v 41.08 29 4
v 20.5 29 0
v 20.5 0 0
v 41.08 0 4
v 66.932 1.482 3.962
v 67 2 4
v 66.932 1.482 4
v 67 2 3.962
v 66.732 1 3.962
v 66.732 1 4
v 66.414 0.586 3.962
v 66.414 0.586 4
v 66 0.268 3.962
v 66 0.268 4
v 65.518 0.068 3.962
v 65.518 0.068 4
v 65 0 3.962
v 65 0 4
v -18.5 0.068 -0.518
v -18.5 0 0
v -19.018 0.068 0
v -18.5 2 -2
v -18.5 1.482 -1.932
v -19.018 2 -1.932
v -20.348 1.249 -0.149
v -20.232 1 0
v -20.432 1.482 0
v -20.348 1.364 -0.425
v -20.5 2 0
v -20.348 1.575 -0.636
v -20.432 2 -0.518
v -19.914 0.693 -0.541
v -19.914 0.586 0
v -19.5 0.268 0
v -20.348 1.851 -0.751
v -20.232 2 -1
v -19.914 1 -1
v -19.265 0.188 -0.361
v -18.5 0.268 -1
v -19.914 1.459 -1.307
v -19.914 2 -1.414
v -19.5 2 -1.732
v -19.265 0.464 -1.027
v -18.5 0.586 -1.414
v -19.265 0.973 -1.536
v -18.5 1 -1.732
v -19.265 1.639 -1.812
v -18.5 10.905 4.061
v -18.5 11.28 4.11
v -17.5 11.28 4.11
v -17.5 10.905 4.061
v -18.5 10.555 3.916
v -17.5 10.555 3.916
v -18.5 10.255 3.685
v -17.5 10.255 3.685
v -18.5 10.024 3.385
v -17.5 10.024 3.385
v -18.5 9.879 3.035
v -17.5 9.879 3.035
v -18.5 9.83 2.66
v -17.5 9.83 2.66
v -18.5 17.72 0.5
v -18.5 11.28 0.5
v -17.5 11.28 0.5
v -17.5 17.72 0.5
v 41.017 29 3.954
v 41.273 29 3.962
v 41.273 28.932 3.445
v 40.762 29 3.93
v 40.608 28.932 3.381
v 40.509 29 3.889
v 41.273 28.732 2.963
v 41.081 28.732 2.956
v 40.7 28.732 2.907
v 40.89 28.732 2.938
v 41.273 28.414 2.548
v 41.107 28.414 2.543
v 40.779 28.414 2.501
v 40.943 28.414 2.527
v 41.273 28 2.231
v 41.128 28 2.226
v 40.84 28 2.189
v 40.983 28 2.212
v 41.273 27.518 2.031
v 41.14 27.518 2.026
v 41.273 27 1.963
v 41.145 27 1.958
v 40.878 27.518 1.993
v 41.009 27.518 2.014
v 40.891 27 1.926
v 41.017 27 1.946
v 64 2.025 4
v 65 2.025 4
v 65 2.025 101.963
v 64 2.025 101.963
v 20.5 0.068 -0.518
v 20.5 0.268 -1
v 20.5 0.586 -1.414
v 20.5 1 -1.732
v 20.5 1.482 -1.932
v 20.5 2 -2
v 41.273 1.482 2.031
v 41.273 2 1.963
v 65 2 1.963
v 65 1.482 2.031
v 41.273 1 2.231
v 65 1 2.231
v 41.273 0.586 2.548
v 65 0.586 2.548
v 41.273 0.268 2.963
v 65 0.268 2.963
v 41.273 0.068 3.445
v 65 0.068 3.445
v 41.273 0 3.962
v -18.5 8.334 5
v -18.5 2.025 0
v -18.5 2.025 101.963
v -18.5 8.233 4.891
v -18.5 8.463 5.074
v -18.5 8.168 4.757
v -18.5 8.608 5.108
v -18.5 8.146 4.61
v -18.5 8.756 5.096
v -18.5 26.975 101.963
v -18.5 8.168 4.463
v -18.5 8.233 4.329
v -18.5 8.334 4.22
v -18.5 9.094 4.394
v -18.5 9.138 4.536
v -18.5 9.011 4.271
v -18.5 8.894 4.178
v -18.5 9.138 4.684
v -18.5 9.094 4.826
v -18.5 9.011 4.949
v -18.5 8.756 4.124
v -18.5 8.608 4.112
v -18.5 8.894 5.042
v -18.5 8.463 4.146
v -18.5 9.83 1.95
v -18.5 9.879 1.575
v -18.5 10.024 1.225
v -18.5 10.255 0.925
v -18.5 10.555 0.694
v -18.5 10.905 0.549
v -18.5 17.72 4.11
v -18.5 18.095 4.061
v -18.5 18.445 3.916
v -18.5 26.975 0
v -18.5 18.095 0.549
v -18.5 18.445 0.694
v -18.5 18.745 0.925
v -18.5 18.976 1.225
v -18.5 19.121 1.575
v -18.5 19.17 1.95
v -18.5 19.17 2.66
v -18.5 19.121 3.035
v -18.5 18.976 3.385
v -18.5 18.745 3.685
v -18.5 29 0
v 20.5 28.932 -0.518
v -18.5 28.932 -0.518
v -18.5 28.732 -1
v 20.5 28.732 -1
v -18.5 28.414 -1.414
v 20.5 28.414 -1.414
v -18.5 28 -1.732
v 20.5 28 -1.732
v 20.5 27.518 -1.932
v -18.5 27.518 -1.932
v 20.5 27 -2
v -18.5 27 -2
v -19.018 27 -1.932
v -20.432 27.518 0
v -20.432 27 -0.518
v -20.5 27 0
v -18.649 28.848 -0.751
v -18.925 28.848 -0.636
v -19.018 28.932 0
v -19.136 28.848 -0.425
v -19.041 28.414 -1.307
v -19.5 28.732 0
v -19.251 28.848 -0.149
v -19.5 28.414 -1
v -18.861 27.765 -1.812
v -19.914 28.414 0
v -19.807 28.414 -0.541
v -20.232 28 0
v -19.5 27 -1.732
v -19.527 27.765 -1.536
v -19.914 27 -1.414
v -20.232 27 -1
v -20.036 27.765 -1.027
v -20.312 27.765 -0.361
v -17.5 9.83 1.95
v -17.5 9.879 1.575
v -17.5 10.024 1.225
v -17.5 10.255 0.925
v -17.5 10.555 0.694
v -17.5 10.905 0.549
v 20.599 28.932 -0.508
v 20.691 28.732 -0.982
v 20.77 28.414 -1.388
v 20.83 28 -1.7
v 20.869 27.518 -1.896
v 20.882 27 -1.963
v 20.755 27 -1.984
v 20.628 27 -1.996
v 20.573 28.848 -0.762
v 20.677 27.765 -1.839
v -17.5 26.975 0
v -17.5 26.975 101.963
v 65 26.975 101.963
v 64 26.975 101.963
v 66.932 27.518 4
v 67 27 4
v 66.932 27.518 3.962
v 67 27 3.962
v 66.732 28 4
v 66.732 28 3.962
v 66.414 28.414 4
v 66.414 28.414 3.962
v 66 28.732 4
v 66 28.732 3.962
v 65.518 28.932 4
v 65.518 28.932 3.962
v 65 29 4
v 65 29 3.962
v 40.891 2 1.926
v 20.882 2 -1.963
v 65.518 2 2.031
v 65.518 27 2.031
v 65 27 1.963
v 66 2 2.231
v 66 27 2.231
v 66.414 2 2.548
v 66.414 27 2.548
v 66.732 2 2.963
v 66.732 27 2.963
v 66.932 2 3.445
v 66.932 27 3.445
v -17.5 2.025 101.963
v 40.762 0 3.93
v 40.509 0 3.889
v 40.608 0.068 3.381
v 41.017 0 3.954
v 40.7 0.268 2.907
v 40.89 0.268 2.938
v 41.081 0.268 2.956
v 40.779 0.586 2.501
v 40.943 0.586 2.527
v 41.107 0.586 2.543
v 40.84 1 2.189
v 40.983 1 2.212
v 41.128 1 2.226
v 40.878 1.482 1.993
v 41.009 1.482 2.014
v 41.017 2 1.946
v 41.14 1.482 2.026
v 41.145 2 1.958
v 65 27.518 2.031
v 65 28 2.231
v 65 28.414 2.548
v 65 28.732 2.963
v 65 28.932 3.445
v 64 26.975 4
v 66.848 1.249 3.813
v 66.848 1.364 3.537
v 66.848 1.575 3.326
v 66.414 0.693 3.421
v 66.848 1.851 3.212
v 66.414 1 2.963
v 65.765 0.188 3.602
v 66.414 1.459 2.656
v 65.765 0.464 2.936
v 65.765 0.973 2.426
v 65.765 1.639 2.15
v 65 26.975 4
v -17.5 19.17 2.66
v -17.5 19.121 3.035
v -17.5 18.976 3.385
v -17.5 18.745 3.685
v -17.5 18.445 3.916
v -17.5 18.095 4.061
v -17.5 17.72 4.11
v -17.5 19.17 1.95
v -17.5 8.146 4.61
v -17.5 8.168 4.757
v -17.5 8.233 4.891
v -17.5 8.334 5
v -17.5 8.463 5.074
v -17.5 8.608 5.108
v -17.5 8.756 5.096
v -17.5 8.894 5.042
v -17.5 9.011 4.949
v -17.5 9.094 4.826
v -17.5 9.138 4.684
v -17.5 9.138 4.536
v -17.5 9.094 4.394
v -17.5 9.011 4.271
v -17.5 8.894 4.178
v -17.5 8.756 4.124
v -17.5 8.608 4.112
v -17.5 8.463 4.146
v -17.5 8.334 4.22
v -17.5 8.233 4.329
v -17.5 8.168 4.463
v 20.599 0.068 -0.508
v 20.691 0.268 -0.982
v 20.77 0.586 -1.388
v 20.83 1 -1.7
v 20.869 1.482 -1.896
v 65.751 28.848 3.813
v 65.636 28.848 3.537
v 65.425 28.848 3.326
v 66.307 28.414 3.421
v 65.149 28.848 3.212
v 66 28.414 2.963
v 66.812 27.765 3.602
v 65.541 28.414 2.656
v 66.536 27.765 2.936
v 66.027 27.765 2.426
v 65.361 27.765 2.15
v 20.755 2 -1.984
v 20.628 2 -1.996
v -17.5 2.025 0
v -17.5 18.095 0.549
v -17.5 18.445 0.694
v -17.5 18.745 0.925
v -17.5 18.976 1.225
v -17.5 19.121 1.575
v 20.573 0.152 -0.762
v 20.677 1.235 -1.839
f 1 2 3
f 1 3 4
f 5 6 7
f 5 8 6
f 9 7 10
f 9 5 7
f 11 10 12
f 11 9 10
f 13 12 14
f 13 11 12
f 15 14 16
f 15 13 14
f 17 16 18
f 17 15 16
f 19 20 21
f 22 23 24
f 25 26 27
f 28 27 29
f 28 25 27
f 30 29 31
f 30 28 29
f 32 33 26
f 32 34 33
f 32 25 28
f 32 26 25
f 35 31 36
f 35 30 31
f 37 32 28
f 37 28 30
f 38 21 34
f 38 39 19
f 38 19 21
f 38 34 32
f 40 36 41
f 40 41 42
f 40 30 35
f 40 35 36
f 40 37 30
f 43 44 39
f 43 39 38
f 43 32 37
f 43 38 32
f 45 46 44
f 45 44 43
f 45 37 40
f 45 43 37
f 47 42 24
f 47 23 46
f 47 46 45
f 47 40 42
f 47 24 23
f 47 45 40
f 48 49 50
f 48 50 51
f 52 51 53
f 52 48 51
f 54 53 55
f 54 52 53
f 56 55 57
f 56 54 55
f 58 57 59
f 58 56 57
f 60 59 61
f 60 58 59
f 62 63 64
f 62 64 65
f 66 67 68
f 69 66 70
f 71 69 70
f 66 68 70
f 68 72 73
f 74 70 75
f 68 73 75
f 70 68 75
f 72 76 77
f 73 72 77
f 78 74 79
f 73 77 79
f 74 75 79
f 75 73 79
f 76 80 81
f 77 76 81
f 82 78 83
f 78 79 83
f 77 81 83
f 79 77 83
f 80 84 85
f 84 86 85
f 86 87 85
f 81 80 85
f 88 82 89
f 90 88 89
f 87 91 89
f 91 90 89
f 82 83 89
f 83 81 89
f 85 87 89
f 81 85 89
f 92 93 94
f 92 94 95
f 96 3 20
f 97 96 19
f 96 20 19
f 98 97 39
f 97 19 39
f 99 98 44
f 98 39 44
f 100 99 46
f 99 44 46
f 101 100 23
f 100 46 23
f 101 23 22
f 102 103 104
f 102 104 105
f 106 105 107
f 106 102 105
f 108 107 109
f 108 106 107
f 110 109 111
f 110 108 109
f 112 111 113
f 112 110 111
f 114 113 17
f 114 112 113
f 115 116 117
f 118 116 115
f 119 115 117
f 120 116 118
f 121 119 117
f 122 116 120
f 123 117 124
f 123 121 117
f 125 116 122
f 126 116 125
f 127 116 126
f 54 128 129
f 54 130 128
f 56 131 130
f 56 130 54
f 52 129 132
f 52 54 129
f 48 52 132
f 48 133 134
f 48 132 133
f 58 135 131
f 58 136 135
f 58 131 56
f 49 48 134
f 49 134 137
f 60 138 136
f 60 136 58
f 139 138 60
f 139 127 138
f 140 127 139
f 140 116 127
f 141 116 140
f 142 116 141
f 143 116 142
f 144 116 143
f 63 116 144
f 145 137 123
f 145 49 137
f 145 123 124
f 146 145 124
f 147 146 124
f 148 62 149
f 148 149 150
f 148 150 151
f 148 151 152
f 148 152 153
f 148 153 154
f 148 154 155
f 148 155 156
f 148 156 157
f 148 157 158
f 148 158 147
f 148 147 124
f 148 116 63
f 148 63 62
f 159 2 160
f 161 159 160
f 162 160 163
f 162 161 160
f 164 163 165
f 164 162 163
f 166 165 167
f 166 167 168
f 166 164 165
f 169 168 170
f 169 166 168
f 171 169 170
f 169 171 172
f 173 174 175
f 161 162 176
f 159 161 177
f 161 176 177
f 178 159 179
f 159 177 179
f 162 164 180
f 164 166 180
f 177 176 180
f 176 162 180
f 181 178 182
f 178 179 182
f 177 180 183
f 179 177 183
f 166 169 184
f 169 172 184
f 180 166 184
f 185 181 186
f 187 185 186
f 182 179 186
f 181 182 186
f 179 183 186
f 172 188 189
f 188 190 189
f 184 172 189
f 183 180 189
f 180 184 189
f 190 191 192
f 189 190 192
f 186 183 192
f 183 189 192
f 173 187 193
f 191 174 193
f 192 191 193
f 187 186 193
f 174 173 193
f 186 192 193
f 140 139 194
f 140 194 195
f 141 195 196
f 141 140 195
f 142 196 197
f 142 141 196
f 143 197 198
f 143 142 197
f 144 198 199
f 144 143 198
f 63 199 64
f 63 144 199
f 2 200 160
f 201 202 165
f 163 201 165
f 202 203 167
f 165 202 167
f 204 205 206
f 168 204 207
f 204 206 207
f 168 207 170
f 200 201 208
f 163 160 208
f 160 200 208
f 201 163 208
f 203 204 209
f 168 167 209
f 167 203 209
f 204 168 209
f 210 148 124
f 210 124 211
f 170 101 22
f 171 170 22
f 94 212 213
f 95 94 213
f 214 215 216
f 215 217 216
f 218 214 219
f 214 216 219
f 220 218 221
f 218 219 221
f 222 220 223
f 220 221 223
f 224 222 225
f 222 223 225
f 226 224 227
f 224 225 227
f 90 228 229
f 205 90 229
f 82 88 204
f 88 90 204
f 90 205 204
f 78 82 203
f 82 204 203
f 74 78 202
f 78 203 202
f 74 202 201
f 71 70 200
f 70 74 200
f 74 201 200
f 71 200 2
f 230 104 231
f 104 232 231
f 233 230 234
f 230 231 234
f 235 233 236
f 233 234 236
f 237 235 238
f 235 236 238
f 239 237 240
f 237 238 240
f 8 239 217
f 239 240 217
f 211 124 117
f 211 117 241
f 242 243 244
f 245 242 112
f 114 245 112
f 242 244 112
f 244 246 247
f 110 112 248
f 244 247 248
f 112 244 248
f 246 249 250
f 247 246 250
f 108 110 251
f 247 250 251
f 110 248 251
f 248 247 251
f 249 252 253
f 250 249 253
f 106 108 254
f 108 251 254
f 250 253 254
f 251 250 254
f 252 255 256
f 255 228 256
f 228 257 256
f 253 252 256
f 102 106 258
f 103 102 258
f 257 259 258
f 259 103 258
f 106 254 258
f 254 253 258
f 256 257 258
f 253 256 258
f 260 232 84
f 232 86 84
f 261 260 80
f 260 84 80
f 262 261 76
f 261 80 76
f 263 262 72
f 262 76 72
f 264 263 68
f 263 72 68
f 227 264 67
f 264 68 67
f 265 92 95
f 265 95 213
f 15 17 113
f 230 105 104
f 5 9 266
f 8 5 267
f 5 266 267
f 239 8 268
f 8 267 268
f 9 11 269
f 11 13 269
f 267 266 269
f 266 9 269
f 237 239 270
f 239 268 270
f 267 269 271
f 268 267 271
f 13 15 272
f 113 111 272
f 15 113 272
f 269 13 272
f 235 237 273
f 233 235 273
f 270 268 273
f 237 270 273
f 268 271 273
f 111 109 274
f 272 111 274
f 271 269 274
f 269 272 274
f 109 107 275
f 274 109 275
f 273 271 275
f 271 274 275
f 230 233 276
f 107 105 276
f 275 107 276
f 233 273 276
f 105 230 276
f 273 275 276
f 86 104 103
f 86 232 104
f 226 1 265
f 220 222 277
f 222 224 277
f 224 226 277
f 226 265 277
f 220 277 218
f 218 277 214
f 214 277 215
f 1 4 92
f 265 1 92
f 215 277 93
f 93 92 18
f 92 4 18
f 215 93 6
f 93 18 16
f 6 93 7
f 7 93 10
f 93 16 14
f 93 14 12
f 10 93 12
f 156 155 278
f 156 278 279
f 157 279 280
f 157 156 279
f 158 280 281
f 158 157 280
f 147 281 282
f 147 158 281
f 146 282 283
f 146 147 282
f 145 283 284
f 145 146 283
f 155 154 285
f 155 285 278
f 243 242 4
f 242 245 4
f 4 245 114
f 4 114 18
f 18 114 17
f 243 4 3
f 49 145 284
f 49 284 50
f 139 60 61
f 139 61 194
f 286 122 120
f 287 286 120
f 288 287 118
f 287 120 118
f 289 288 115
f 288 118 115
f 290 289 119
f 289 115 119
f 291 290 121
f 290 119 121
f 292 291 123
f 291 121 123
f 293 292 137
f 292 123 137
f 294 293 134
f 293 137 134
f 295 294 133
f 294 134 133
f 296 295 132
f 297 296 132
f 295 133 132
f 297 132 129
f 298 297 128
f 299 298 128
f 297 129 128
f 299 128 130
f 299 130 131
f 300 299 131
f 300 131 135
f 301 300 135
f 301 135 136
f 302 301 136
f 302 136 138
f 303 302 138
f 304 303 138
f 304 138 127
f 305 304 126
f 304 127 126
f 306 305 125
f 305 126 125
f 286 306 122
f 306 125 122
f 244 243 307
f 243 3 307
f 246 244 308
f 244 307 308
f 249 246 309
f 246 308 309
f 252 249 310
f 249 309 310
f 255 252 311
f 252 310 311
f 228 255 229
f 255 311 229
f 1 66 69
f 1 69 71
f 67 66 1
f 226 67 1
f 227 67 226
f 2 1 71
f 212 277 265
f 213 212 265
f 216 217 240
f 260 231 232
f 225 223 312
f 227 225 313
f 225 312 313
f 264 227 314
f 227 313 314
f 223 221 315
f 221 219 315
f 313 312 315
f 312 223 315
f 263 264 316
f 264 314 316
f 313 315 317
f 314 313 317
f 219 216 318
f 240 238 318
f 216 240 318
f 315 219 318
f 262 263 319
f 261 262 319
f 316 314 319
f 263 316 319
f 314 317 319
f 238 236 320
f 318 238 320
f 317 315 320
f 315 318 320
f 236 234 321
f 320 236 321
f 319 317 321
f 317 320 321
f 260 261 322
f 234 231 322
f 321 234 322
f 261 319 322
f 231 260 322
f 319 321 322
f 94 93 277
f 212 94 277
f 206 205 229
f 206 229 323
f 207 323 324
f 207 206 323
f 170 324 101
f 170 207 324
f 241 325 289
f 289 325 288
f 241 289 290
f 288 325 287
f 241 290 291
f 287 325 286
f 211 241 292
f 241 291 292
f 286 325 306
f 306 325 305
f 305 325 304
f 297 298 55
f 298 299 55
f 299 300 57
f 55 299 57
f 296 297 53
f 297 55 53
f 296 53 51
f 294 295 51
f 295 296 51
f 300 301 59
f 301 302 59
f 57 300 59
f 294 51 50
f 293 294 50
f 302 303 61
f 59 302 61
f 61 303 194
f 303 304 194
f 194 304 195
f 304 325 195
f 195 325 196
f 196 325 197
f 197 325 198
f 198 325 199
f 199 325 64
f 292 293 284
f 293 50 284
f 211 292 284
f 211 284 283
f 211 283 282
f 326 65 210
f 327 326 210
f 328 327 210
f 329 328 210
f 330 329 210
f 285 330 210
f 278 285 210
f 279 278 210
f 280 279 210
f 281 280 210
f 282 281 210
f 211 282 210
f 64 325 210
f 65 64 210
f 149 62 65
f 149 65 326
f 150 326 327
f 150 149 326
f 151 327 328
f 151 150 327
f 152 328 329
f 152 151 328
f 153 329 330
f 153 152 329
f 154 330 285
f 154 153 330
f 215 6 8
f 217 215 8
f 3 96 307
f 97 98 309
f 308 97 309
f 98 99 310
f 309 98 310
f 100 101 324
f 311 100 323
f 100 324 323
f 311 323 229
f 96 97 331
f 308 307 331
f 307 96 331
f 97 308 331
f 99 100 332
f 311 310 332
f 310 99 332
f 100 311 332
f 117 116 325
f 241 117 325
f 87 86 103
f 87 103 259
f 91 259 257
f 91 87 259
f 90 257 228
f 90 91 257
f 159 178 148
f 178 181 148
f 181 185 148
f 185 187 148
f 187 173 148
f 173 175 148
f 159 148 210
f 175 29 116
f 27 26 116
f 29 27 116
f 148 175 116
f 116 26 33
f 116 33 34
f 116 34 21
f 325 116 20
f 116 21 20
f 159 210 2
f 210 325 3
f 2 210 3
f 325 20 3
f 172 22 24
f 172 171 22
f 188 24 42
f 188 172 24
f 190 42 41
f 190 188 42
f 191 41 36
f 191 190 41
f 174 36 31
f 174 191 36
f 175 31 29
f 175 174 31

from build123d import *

# Parameters (mm, degrees)
BOSS_EXTRUDE1_DEPTH = 29
SKETCH2_W           = 1
SKETCH2_H           = 24.95
BOSS_EXTRUDE2_DEPTH = 100
SKETCH4_W           = 1
SKETCH4_H           = 24.95
BOSS_EXTRUDE3_DEPTH = 101.96257304
CUT_EXTRUDE1_DEPTH  = 1
SKETCH6_R           = 0.498897706
CUT_EXTRUDE2_DEPTH  = 1
FILLET1_R           = 2


with BuildPart() as part:
    # Sketch1 → Boss-Extrude1 (new body)
    with BuildSketch(Plane(origin=(0, 0, 0), x_dir=(1, 0, 0), z_dir=(0, 1, 0))):
        Polygon((-20.5, 0), (20.5, 0), (41.08, -4), (47.08, -4), (67, -4), (67, -1.96257304), (47.08, -1.96257304), (41.08, -1.96257304), (20.69256171, 2), (-20.5, 2), align=None)
    extrude(amount=BOSS_EXTRUDE1_DEPTH)

    # Sketch2 → Boss-Extrude2 (add)
    with BuildSketch(Plane(origin=(0, 0, 1.96257304), x_dir=(-1, 0, 0), z_dir=(0, 0, -1))):
        with Locations((-64.5, 14.5)):
            Rectangle(SKETCH2_W, SKETCH2_H)
    extrude(amount=-BOSS_EXTRUDE2_DEPTH)

    # Sketch4 → Boss-Extrude3 (add)
    with BuildSketch(Plane.XY):
        with Locations((-18, 14.5)):
            Rectangle(SKETCH4_W, SKETCH4_H)
    extrude(amount=BOSS_EXTRUDE3_DEPTH)

    # Sketch5 → Cut-Extrude1 (cut)
    with BuildSketch(Plane.ZY.offset(18.5)):
        with BuildLine():
            Line((1.95, 19.17), (2.66, 19.17))
            ThreePointArc((2.66, 19.17), (3.685304833, 18.745304833), (4.11, 17.72))
            Line((4.11, 17.72), (4.11, 11.28))
            ThreePointArc((4.11, 11.28), (3.685304833, 10.254695167), (2.66, 9.83))
            Line((2.66, 9.83), (1.95, 9.83))
            ThreePointArc((1.95, 9.83), (0.924695167, 10.254695167), (0.5, 11.28))
            Line((0.5, 11.28), (0.5, 17.72))
            ThreePointArc((0.5, 17.72), (0.924695167, 18.745304833), (1.95, 19.17))
        make_face()
    extrude(amount=-CUT_EXTRUDE1_DEPTH, mode=Mode.SUBTRACT)

    # Sketch6 → Cut-Extrude2 (cut)
    with BuildSketch(Plane.ZY.offset(18.5)):
        with Locations(Location((4.61, 8.645, 0), (0, 0, 270))):
            Circle(SKETCH6_R)
    extrude(amount=-CUT_EXTRUDE2_DEPTH, mode=Mode.SUBTRACT)

    # Fillet1
    fillet1_edges = [part.edges().sort_by_distance(p)[0] for p in [
        (0.096280855, 0, -2),
        (30.886280855, 0, -0.01871348),
        (54.04, 0, 1.96257304),
        (67, 0, 2.98128652),
        (-20.5, 0, -1),
        (-20.5, 14.5, -2),
        (20.69256171, 14.5, -2),
        (41.08, 14.5, 1.96257304),
        (67, 14.5, 1.96257304),
        (67, 29, 2.98128652),
        (54.04, 29, 1.96257304),
        (30.886280855, 29, -0.01871348),
        (0.096280855, 29, -2),
        (-20.5, 29, -1),
    ]]
    fillet(fillet1_edges, radius=FILLET1_R - 0.0001)  # a hair under: the kernel refuses the full size


solid = part.part
